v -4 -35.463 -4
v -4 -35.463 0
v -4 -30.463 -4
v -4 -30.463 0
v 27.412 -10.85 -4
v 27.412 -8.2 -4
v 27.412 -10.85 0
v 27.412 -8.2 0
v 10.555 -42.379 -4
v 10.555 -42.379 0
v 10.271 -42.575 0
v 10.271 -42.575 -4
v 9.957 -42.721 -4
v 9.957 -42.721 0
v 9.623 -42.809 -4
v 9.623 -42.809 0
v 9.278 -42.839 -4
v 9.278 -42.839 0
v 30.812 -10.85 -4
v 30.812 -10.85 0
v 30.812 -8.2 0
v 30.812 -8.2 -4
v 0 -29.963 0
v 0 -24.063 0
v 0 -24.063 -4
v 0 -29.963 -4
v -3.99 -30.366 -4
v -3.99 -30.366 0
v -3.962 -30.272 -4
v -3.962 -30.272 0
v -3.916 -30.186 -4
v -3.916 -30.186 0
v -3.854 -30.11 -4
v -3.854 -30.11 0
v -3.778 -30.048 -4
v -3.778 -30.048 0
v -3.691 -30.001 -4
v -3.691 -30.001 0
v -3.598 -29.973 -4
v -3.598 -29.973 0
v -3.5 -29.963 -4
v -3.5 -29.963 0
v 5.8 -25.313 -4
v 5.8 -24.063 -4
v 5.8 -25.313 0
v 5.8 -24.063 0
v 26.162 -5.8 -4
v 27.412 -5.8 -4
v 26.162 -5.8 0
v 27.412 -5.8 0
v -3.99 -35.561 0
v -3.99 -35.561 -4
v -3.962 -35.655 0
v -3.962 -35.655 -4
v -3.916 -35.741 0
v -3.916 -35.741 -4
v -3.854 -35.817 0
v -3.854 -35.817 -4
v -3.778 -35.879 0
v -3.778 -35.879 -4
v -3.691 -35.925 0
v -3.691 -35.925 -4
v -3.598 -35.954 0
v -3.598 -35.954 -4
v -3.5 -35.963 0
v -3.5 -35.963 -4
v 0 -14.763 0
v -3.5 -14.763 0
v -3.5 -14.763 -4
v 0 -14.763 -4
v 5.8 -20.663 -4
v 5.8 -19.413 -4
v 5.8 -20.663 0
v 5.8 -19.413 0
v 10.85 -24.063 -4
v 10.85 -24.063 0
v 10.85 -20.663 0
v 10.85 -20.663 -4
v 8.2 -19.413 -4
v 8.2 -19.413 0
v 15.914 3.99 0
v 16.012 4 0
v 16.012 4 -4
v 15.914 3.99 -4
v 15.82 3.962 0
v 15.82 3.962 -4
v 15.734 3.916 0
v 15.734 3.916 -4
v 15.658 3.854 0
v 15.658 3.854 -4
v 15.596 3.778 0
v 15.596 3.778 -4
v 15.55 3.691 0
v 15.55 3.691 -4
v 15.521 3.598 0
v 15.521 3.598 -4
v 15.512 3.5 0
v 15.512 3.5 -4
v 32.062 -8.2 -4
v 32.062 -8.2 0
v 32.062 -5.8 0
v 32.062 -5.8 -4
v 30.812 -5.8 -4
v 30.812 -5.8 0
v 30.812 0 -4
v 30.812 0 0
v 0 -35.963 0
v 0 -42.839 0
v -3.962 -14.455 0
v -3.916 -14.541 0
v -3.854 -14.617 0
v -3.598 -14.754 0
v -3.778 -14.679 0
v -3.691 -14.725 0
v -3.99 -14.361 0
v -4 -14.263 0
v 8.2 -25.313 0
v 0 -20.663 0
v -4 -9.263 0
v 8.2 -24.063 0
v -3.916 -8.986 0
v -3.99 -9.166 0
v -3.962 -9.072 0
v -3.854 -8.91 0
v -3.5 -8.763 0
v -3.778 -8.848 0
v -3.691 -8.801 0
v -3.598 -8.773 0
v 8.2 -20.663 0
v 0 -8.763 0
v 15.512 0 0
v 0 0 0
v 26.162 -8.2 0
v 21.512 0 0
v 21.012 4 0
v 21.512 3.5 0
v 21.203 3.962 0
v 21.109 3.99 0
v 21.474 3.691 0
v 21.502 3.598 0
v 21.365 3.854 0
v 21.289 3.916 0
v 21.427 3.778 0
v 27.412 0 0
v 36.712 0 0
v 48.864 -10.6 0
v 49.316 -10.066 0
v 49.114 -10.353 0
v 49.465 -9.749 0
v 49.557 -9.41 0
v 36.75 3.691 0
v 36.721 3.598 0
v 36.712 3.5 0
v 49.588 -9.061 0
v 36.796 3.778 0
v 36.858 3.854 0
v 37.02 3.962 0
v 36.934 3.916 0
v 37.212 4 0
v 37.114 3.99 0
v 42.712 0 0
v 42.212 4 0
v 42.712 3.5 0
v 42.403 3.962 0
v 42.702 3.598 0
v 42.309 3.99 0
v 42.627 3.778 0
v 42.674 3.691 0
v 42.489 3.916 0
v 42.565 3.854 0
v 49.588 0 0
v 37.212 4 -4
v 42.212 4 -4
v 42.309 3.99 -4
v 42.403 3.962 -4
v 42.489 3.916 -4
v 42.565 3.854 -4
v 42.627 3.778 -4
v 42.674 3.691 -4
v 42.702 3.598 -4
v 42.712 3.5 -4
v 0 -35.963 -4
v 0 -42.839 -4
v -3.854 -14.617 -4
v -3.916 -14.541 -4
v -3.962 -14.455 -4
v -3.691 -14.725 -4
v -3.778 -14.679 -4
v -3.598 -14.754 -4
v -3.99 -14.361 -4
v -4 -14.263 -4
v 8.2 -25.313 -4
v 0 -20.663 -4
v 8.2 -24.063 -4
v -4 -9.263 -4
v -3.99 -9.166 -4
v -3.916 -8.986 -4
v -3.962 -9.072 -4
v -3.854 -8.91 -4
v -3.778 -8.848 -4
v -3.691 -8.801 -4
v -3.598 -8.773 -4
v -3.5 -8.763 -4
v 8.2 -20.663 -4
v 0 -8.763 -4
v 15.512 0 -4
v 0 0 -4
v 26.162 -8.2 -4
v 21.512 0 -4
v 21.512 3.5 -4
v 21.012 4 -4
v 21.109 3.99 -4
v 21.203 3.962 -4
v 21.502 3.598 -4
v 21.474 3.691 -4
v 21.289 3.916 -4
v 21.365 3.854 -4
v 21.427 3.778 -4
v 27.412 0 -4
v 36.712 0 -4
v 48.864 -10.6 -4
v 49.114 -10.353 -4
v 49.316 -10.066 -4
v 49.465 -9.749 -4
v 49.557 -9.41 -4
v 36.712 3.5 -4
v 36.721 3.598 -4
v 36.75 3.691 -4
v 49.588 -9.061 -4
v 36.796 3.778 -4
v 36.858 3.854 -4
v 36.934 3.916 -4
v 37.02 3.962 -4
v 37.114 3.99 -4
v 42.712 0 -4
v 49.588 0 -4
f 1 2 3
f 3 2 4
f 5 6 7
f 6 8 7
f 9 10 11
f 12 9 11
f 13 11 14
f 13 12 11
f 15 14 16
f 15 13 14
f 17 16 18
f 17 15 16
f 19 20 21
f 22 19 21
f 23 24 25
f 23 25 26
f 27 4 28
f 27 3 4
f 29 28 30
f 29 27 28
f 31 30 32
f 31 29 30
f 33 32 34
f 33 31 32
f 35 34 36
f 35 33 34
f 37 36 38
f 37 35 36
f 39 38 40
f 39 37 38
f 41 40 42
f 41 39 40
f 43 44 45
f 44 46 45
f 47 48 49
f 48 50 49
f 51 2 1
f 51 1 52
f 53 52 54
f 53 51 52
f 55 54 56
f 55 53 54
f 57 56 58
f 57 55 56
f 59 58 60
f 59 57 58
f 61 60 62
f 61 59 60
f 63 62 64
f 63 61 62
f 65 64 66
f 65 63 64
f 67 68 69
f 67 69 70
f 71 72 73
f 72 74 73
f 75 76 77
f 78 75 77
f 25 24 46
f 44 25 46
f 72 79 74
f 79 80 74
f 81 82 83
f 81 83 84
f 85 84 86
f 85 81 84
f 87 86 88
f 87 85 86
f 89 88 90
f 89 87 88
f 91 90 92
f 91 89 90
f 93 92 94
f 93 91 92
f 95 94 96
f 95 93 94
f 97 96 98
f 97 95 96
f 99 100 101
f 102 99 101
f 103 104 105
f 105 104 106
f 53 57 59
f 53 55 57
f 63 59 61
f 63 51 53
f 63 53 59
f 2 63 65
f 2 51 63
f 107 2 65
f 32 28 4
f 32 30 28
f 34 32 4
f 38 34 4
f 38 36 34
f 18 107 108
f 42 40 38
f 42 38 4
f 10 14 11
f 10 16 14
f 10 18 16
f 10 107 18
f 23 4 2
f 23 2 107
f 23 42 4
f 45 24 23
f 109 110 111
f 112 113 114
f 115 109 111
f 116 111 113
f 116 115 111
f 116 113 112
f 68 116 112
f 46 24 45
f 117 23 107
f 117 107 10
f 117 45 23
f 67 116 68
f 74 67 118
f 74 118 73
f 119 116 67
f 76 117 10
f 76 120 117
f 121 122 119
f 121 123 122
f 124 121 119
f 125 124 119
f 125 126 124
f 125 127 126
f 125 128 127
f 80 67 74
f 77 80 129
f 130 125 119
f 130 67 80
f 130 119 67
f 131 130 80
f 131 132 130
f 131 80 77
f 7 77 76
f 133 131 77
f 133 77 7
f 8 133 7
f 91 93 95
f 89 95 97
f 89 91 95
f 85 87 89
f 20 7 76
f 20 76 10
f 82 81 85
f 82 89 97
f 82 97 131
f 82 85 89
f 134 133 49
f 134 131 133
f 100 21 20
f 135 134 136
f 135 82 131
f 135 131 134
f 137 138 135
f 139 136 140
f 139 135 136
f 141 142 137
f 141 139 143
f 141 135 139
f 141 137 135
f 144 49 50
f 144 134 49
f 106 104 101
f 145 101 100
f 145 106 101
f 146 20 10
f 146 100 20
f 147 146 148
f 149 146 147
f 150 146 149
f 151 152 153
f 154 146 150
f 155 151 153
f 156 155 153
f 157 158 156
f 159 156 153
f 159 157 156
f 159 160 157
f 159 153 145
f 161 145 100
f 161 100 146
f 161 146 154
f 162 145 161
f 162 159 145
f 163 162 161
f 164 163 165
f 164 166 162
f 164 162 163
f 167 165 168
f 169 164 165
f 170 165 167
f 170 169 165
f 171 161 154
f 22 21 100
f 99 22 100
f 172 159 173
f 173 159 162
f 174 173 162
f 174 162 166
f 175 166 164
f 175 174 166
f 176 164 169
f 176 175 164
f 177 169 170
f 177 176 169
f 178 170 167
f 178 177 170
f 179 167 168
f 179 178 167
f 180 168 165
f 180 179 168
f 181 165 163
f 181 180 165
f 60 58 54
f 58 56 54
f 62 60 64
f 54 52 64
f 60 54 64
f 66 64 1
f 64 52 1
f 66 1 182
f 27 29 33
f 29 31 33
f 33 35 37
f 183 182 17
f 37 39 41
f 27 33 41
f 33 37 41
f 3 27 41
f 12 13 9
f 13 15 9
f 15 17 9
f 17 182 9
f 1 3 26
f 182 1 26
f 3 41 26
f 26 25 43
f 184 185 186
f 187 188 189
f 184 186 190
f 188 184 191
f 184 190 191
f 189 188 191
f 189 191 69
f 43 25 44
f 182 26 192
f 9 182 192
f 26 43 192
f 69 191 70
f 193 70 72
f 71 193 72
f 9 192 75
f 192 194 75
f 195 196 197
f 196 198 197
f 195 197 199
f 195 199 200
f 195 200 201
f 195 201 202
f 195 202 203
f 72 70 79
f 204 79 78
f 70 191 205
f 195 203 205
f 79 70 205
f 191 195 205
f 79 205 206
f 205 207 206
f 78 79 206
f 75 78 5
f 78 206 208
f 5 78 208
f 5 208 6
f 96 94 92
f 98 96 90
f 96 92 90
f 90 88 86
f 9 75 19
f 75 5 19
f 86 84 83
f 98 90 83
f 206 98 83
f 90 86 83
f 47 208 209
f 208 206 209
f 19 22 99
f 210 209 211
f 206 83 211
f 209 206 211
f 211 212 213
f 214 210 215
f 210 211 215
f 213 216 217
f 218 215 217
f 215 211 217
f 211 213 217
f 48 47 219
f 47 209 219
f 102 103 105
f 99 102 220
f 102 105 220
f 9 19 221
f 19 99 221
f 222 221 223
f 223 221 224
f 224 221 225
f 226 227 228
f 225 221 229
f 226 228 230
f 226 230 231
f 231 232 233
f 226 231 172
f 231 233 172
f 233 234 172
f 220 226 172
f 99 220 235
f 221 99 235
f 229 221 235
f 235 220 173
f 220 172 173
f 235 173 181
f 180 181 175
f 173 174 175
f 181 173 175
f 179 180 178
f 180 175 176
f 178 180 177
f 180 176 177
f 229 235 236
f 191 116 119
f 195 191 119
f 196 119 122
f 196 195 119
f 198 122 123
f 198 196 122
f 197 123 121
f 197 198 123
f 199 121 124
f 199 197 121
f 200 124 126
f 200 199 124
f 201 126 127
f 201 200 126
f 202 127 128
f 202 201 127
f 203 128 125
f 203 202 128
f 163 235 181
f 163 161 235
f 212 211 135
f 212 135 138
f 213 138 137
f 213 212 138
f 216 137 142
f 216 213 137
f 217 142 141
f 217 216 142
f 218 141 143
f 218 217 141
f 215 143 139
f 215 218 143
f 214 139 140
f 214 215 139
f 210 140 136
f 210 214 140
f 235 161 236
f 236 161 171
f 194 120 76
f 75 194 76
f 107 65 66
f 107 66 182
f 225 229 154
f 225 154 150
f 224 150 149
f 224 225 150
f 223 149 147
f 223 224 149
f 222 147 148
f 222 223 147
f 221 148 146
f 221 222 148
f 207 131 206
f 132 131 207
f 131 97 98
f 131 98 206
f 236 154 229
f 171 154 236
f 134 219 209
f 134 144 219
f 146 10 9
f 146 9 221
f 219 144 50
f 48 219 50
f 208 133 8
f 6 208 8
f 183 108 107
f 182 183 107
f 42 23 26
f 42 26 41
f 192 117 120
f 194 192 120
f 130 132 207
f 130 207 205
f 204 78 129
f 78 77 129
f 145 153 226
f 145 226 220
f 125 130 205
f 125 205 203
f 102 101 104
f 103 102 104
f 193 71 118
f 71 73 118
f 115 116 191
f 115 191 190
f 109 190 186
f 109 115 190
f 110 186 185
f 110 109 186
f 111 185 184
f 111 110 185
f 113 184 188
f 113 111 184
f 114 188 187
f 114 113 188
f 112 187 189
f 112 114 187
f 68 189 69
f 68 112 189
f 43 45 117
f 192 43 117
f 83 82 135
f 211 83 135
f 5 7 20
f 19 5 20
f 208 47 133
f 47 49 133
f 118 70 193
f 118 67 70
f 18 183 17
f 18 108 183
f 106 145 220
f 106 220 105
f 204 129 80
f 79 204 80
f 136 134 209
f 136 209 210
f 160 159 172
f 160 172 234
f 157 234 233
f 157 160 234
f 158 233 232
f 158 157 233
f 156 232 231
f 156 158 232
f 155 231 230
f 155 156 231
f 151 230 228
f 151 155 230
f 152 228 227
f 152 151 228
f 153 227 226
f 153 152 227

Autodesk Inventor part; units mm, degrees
ref_plane "YZ Plane" through (0, 0, 0) normal (1, 0, 0) x (0, 1, 0)
ref_plane "XZ Plane" through (0, 0, 0) normal (0, 1, 0) x (-1, 0, 0)
ref_plane "XY Plane" through (0, 0, 0) normal (0, 0, 1) x (1, 0, 0)
sketch "Sketch1" plane through (0, 0, 0) normal (0, 0, 1) x (1, 0, 0)
  line L0 (0, -42.8392) -> (0, 0.8108) projected
  line L1 (0, 0) -> (49.5875, 0)
  line L2 (0, -42.8392) -> (10, -42.8392)
  line L3 (10, -42.8392) -> (49.5875, -10)
  line L4 (49.5875, -10) -> (49.5875, 0)
  line L5 (0, -42.8392) -> (0, 0)
  line L6 (0, 0) -> (49.5875, 0)
  line L7 (21.7117, 0) -> (36.5117, 0) construction
  dimension "d0" = 10
  dimension "d1" = 10
extrude "Extrusion1" add sketch "Sketch1" against normal blind 4
fillet "Fillet1" radius 2 2 edges at (49.5875, -10, -2) (10, -42.8392, -2)
sketch "Sketch2" plane through (0, 0, 0) normal (0, 0, 1) x (1, 0, 0)
  line L0 (14.6536, -1.8875) -> (0, -1.8875) construction
  line L1 (0, -1.8875) -> (0, -8.7634) projected
  line L2 (0, -8.7634) -> (-6.35, -8.7634) projected
  line L3 (-6.35, -8.7634) -> (-6.35, -14.7634) projected
  line L4 (-6.35, -14.7634) -> (0, -14.7634) projected
  line L5 (0, -14.7634) -> (0, -20.8634) projected
  line L6 (0, -20.8634) -> (6, -20.8634) projected
  line L7 (6, -20.8634) -> (6, -19.6134) projected
  line L8 (6, -19.6134) -> (8, -19.6134) projected
  line L9 (8, -19.6134) -> (8, -20.8634) projected
  line L10 (8, -20.8634) -> (10.65, -20.8634) projected
  line L11 (10.65, -20.8634) -> (10.65, -23.8634) projected
  line L12 (10.65, -23.8634) -> (8, -23.8634) projected
  line L13 (8, -23.8634) -> (8, -25.1134) projected
  line L14 (8, -25.1134) -> (6, -25.1134) projected
  line L15 (6, -25.1134) -> (6, -23.8634) projected
  line L16 (6, -23.8634) -> (0, -23.8634) projected
  line L17 (0, -23.8634) -> (0, -29.9634) projected
  line L18 (0, -29.9634) -> (-6.35, -29.9634) projected
  line L19 (-6.35, -29.9634) -> (-6.35, -35.9634) projected
  line L20 (-6.35, -35.9634) -> (0, -35.9634) projected
  line L21 (0, -35.9634) -> (0, -42.8392) projected
  line L22 (0, -42.8392) -> (14.6536, -42.8392) projected
  line L23 (14.6536, -42.8392) -> (14.6536, -1.8875) construction
  line L24 (49.5875, -14.6536) -> (49.5875, 0) projected
  line L25 (49.5875, 0) -> (42.7117, 0) projected
  line L26 (42.7117, 0) -> (42.7117, 6.35) projected
  line L27 (42.7117, 6.35) -> (36.7117, 6.35) projected
  line L28 (36.7117, 6.35) -> (36.7117, 0) projected
  line L29 (36.7117, 0) -> (30.6117, 0) projected
  line L30 (30.6117, 0) -> (30.6117, -6) projected
  line L31 (30.6117, -6) -> (31.8617, -6) projected
  line L32 (31.8617, -6) -> (31.8617, -8) projected
  line L33 (31.8617, -8) -> (30.6117, -8) projected
  line L34 (30.6117, -8) -> (30.6117, -10.65) projected
  line L35 (30.6117, -10.65) -> (27.6117, -10.65) projected
  line L36 (27.6117, -10.65) -> (27.6117, -8) projected
  line L37 (27.6117, -8) -> (26.3617, -8) projected
  line L38 (26.3617, -8) -> (26.3617, -6) projected
  line L39 (26.3617, -6) -> (27.6117, -6) projected
  line L40 (27.6117, -6) -> (27.6117, 0) projected
  line L41 (27.6117, 0) -> (21.5117, 0) projected
  line L42 (21.5117, 0) -> (21.5117, 6.35) projected
  line L43 (21.5117, 6.35) -> (15.5117, 6.35) projected
  line L44 (15.5117, 6.35) -> (15.5117, 0) projected
  line L45 (15.5117, 0) -> (8.6359, 0) projected
  line L46 (8.6359, 0) -> (8.6359, -14.6536) construction
  line L47 (8.6359, -14.6536) -> (49.5875, -14.6536) construction
  line L48 (49.5875, 0) -> (0, -42.8392)
  line L49 (8.6359, 0) -> (0, -1.8875)
  point P0 (0, 0)
extrude "Extrusion2" add sketch "Sketch2" against normal blind 4
sketch "Sketch3" plane through (0, 0, 0) normal (0, 0, 1) x (1, 0, 0)
  line L0 (14.6536, -1.8875) -> (0, -1.8875) projected
  line L1 (0, -1.8875) -> (0, -8.7634) projected
  line L2 (0, -8.7634) -> (-6.35, -8.7634) projected
  line L3 (-6.35, -8.7634) -> (-6.35, -14.7634) projected
  line L4 (-6.35, -14.7634) -> (0, -14.7634) projected
  line L5 (0, -14.7634) -> (0, -20.8634) projected
  line L6 (0, -20.8634) -> (6, -20.8634) projected
  line L7 (6, -20.8634) -> (6, -19.6134) projected
  line L8 (6, -19.6134) -> (8, -19.6134) projected
  line L9 (8, -19.6134) -> (8, -20.8634) projected
  line L10 (8, -20.8634) -> (10.65, -20.8634) projected
  line L11 (10.65, -20.8634) -> (10.65, -23.8634) projected
  line L12 (10.65, -23.8634) -> (8, -23.8634) projected
  line L13 (8, -23.8634) -> (8, -25.1134) projected
  line L14 (8, -25.1134) -> (6, -25.1134) projected
  line L15 (6, -25.1134) -> (6, -23.8634) projected
  line L16 (6, -23.8634) -> (0, -23.8634) projected
  line L17 (0, -23.8634) -> (0, -29.9634) projected
  line L18 (0, -29.9634) -> (-6.35, -29.9634) projected
  line L19 (-6.35, -29.9634) -> (-6.35, -35.9634) projected
  line L20 (-6.35, -35.9634) -> (0, -35.9634) projected
  line L21 (0, -35.9634) -> (0, -42.8392) projected
  line L22 (0, -42.8392) -> (14.6536, -42.8392) projected
  line L23 (14.6536, -42.8392) -> (14.6536, -1.8875) projected
  line L24 (49.5875, -14.6536) -> (49.5875, 0) projected
  line L25 (49.5875, 0) -> (42.7117, 0) projected
  line L26 (42.7117, 0) -> (42.7117, 6.35) projected
  line L27 (42.7117, 6.35) -> (36.7117, 6.35) projected
  line L28 (36.7117, 6.35) -> (36.7117, 0) projected
  line L29 (36.7117, 0) -> (30.6117, 0) projected
  line L30 (30.6117, 0) -> (30.6117, -6) projected
  line L31 (30.6117, -6) -> (31.8617, -6) projected
  line L32 (31.8617, -6) -> (31.8617, -8) projected
  line L33 (31.8617, -8) -> (30.6117, -8) projected
  line L34 (30.6117, -8) -> (30.6117, -10.65) projected
  line L35 (30.6117, -10.65) -> (27.6117, -10.65) projected
  line L36 (27.6117, -10.65) -> (27.6117, -8) projected
  line L37 (27.6117, -8) -> (26.3617, -8) projected
  line L38 (26.3617, -8) -> (26.3617, -6) projected
  line L39 (26.3617, -6) -> (27.6117, -6) projected
  line L40 (27.6117, -6) -> (27.6117, 0) projected
  line L41 (27.6117, 0) -> (21.5117, 0) projected
  line L42 (21.5117, 0) -> (21.5117, 6.35) projected
  line L43 (21.5117, 6.35) -> (15.5117, 6.35) projected
  line L44 (15.5117, 6.35) -> (15.5117, 0) projected
  line L45 (15.5117, 0) -> (8.6359, 0) projected
  line L46 (8.6359, 0) -> (8.6359, -14.6536) projected
  line L47 (8.6359, -14.6536) -> (49.5875, -14.6536) projected
  line L48 (0, -23.8634) -> (0, -20.8634)
  line L49 (0, -14.7634) -> (0, -29.9634) projected
  line L50 (27.6117, 0) -> (30.6117, 0)
  line L51 (36.7117, 0) -> (21.5117, 0) projected
  point P0 (0, 0)
extrude "Extrusion3" cut sketch "Sketch3" against normal blind 4 contours L6 L7 L8 L9 L10 L11 L12 L13 L14 L15 L16 L48 | L50 L30 L31 L32 L33 L34 L35 L36 L37 L38 L39 L40
sketch "Sketch4" plane through (0, 0, 0) normal (0, 0, 1) x (1, 0, 0)
  line L0 (30.6117, 0) -> (30.6117, -6) projected
  line L1 (30.6117, -6) -> (31.8617, -6) projected
  line L2 (31.8617, -6) -> (31.8617, -8) projected
  line L3 (31.8617, -8) -> (30.6117, -8) projected
  line L4 (30.6117, -8) -> (30.6117, -10.65) projected
  line L5 (30.6117, -10.65) -> (27.6117, -10.65) projected
  line L6 (27.6117, -10.65) -> (27.6117, -8) projected
  line L7 (27.6117, -8) -> (26.3617, -8) projected
  line L8 (26.3617, -8) -> (26.3617, -6) projected
  line L9 (26.3617, -6) -> (27.6117, -6) projected
  line L10 (27.6117, -6) -> (27.6117, 0) projected
  line L11 (27.6117, 0) -> (21.5117, 0) projected
  line L12 (21.5117, 0) -> (21.5117, 6.35) projected
  line L13 (21.5117, 6.35) -> (15.5117, 6.35) projected
  line L14 (15.5117, 6.35) -> (15.5117, 0) projected
  line L15 (15.5117, 0) -> (0, 0) projected
  line L16 (0, 0) -> (0, -8.7634) projected
  line L17 (0, -8.7634) -> (-6.35, -8.7634) projected
  line L18 (-6.35, -8.7634) -> (-6.35, -14.7634) projected
  line L19 (-6.35, -14.7634) -> (0, -14.7634) projected
  line L20 (0, -14.7634) -> (0, -29.9634) projected
  line L21 (0, -29.9634) -> (-6.35, -29.9634) projected
  line L22 (-6.35, -29.9634) -> (-6.35, -35.9634) projected
  line L23 (-6.35, -35.9634) -> (0, -35.9634) projected
  line L24 (0, -35.9634) -> (0, -42.8392) projected
  line L25 (0, -42.8392) -> (9.2784, -42.8392) projected
  arc A0 (9.2784, -42.8392) -> (10.5554, -42.3785) centre (9.2784, -40.8392) ccw projected
  line L26 (10.5554, -42.3785) -> (48.8645, -10.5998) projected
  arc A1 (48.8645, -10.5998) -> (49.5875, -9.0605) centre (47.5875, -9.0605) ccw projected
  line L27 (49.5875, -9.0605) -> (49.5875, 0) projected
  line L28 (49.5875, 0) -> (42.7117, 0) projected
  line L29 (42.7117, 0) -> (42.7117, 6.35) projected
  line L30 (42.7117, 6.35) -> (36.7117, 6.35) projected
  line L31 (36.7117, 6.35) -> (36.7117, 0) projected
  line L32 (36.7117, 0) -> (30.6117, 0) projected
  line L33 (6, -23.8634) -> (0, -23.8634) projected
  line L34 (0, -23.8634) -> (0, -20.8634) projected
  line L35 (0, -20.8634) -> (6, -20.8634) projected
  line L36 (6, -20.8634) -> (6, -19.6134) projected
  line L37 (6, -19.6134) -> (8, -19.6134) projected
  line L38 (8, -19.6134) -> (8, -20.8634) projected
  line L39 (8, -20.8634) -> (10.65, -20.8634) projected
  line L40 (10.65, -20.8634) -> (10.65, -23.8634) projected
  line L41 (10.65, -23.8634) -> (8, -23.8634) projected
  line L42 (8, -23.8634) -> (8, -25.1134) projected
  line L43 (8, -25.1134) -> (6, -25.1134) projected
  line L44 (6, -25.1134) -> (6, -23.8634) projected
  line L45 (36.7117, 0) -> (30.6117, 0) projected
  line L46 (27.6117, 0) -> (30.6117, 0)
  line L47 (36.9117, 0) -> (36.9117, 6.15)
  line L48 (36.9117, 6.15) -> (42.5117, 6.15)
  line L49 (42.5117, 6.15) -> (42.5117, -0.2)
  line L50 (42.5117, -0.2) -> (49.3875, -0.2)
  line L51 (49.3875, -0.2) -> (49.3875, -9.0605)
  arc A2 (48.7368, -10.4459) -> (49.3875, -9.0605) centre (47.5875, -9.0605) ccw
  line L52 (48.7368, -10.4459) -> (10.4277, -42.2246)
  arc A3 (9.2784, -42.6392) -> (10.4277, -42.2246) centre (9.2784, -40.8392) ccw
  line L53 (9.2784, -42.6392) -> (0.2, -42.6392)
  line L54 (0.2, -42.6392) -> (0.2, -35.7634)
  line L55 (0.2, -35.7634) -> (-6.15, -35.7634)
  line L56 (-6.15, -35.7634) -> (-6.15, -30.1634)
  line L57 (-6.15, -30.1634) -> (0.2, -30.1634)
  line L58 (0.2, -30.1634) -> (0.2, -14.5634)
  line L59 (0.2, -14.5634) -> (-6.15, -14.5634)
  line L60 (-6.15, -14.5634) -> (-6.15, -8.9634)
  line L61 (-6.15, -8.9634) -> (0.2, -8.9634)
  line L62 (0.2, -8.9634) -> (0.2, -0.2)
  line L63 (0.2, -0.2) -> (15.7117, -0.2)
  line L64 (15.7117, -0.2) -> (15.7117, 6.15)
  line L65 (15.7117, 6.15) -> (21.3117, 6.15)
  line L66 (21.3117, 6.15) -> (21.3117, -0.2)
  line L67 (27.4117, -0.2) -> (27.4117, -5.8)
  line L68 (27.4117, -5.8) -> (26.1617, -5.8)
  line L69 (26.1617, -5.8) -> (26.1617, -8.2)
  line L70 (26.1617, -8.2) -> (27.4117, -8.2)
  line L71 (27.4117, -8.2) -> (27.4117, -10.85)
  line L72 (27.4117, -10.85) -> (30.8117, -10.85)
  line L73 (30.8117, -10.85) -> (30.8117, -8.2)
  line L74 (30.8117, -8.2) -> (32.0617, -8.2)
  line L75 (32.0617, -8.2) -> (32.0617, -5.8)
  line L76 (32.0617, -5.8) -> (30.8117, -5.8)
  line L77 (30.8117, -5.8) -> (30.8117, 0)
  line L78 (10.85, -20.6634) -> (8.2, -20.6634)
  line L79 (8.2, -20.6634) -> (8.2, -19.4134)
  line L80 (8.2, -19.4134) -> (5.8, -19.4134)
  line L81 (5.8, -19.4134) -> (5.8, -20.6634)
  line L82 (5.8, -20.6634) -> (-0.2, -20.6634)
  line L83 (-0.2, -20.6634) -> (-0.2, -24.0634)
  line L84 (-0.2, -24.0634) -> (5.8, -24.0634)
  line L85 (5.8, -24.0634) -> (5.8, -25.3134)
  line L86 (5.8, -25.3134) -> (8.2, -25.3134)
  line L87 (8.2, -25.3134) -> (8.2, -24.0634)
  line L88 (8.2, -24.0634) -> (10.85, -24.0634)
  line L89 (10.85, -24.0634) -> (10.85, -20.6634)
  line L90 (30.8117, -0.2) -> (30.8117, 0)
  line L91 (30.8117, 0) -> (27.4117, 0)
  line L92 (27.4117, 0) -> (27.4117, -0.2)
  point P0 (0, 0)
  dimension "d9" = 0.2
  dimension "d10" = 0.2
extrude "Extrusion4" cut sketch "Sketch4" against normal blind 25.4 contours L32 L77 L76 L75 L74 L73 L72 L71 L70 L69 L68 L67 L92 L11 L10 L9 L8 L7 L6 L5 L4 L3 L2 L1 L0 | L0 L1 L2 L3 L4 L5 L6 L7 L8 L9 L10 L46 | L82 L58 L35 L20 | L20 L84 L83 L82 | L35 L58 L33 L20 | L82 L81 L80 L79 L78 L89 L88 L87 L86 L85 L84 L58 L33 L44 L43 L42 L41 L40 L39 L38 L37 L36 L35 | L33 L58 L84 L20 | L35 L36 L37 L38 L39 L40 L41 L42 L43 L44 L33 L58
sketch "Sketch5" plane through (0, 0, 0) normal (0, 0, 1) x (1, 0, 0)
  line L0 (42.9117, 4) -> (46.4125, 4)
  line L1 (-4, -102.5091) -> (-4, 2)
  line L2 (61.4276, 22.986) -> (8.4509, 22.986)
  line L3 (8.4509, 22.986) -> (8.4509, 4)
  line L4 (8.4509, 4) -> (61.4276, 4)
  line L5 (61.4276, 4) -> (61.4276, 22.986)
  line L6 (-4, 2) -> (-14.2218, 2)
  line L7 (-14.2218, 2) -> (-14.2218, -39.6128)
  line L8 (-14.2218, -39.6128) -> (-4, -39.6128)
  line L9 (-4, -39.6128) -> (-4, 2)
  point P0 (0, 0)
extrude "Extrusion5" cut sketch "Sketch5" against normal blind 25.4
fillet "Fillet2" radius 0.5 8 edges at (42.7117, 4, -2) (36.7117, 4, -2) (21.5117, 4, -2) (15.5117, 4, -2) (-4, -8.7634, -2) (-4, -14.7634, -2) (-4, -29.9634, -2) (-4, -35.9634, -2)
properties part number "motor_brace_3"
